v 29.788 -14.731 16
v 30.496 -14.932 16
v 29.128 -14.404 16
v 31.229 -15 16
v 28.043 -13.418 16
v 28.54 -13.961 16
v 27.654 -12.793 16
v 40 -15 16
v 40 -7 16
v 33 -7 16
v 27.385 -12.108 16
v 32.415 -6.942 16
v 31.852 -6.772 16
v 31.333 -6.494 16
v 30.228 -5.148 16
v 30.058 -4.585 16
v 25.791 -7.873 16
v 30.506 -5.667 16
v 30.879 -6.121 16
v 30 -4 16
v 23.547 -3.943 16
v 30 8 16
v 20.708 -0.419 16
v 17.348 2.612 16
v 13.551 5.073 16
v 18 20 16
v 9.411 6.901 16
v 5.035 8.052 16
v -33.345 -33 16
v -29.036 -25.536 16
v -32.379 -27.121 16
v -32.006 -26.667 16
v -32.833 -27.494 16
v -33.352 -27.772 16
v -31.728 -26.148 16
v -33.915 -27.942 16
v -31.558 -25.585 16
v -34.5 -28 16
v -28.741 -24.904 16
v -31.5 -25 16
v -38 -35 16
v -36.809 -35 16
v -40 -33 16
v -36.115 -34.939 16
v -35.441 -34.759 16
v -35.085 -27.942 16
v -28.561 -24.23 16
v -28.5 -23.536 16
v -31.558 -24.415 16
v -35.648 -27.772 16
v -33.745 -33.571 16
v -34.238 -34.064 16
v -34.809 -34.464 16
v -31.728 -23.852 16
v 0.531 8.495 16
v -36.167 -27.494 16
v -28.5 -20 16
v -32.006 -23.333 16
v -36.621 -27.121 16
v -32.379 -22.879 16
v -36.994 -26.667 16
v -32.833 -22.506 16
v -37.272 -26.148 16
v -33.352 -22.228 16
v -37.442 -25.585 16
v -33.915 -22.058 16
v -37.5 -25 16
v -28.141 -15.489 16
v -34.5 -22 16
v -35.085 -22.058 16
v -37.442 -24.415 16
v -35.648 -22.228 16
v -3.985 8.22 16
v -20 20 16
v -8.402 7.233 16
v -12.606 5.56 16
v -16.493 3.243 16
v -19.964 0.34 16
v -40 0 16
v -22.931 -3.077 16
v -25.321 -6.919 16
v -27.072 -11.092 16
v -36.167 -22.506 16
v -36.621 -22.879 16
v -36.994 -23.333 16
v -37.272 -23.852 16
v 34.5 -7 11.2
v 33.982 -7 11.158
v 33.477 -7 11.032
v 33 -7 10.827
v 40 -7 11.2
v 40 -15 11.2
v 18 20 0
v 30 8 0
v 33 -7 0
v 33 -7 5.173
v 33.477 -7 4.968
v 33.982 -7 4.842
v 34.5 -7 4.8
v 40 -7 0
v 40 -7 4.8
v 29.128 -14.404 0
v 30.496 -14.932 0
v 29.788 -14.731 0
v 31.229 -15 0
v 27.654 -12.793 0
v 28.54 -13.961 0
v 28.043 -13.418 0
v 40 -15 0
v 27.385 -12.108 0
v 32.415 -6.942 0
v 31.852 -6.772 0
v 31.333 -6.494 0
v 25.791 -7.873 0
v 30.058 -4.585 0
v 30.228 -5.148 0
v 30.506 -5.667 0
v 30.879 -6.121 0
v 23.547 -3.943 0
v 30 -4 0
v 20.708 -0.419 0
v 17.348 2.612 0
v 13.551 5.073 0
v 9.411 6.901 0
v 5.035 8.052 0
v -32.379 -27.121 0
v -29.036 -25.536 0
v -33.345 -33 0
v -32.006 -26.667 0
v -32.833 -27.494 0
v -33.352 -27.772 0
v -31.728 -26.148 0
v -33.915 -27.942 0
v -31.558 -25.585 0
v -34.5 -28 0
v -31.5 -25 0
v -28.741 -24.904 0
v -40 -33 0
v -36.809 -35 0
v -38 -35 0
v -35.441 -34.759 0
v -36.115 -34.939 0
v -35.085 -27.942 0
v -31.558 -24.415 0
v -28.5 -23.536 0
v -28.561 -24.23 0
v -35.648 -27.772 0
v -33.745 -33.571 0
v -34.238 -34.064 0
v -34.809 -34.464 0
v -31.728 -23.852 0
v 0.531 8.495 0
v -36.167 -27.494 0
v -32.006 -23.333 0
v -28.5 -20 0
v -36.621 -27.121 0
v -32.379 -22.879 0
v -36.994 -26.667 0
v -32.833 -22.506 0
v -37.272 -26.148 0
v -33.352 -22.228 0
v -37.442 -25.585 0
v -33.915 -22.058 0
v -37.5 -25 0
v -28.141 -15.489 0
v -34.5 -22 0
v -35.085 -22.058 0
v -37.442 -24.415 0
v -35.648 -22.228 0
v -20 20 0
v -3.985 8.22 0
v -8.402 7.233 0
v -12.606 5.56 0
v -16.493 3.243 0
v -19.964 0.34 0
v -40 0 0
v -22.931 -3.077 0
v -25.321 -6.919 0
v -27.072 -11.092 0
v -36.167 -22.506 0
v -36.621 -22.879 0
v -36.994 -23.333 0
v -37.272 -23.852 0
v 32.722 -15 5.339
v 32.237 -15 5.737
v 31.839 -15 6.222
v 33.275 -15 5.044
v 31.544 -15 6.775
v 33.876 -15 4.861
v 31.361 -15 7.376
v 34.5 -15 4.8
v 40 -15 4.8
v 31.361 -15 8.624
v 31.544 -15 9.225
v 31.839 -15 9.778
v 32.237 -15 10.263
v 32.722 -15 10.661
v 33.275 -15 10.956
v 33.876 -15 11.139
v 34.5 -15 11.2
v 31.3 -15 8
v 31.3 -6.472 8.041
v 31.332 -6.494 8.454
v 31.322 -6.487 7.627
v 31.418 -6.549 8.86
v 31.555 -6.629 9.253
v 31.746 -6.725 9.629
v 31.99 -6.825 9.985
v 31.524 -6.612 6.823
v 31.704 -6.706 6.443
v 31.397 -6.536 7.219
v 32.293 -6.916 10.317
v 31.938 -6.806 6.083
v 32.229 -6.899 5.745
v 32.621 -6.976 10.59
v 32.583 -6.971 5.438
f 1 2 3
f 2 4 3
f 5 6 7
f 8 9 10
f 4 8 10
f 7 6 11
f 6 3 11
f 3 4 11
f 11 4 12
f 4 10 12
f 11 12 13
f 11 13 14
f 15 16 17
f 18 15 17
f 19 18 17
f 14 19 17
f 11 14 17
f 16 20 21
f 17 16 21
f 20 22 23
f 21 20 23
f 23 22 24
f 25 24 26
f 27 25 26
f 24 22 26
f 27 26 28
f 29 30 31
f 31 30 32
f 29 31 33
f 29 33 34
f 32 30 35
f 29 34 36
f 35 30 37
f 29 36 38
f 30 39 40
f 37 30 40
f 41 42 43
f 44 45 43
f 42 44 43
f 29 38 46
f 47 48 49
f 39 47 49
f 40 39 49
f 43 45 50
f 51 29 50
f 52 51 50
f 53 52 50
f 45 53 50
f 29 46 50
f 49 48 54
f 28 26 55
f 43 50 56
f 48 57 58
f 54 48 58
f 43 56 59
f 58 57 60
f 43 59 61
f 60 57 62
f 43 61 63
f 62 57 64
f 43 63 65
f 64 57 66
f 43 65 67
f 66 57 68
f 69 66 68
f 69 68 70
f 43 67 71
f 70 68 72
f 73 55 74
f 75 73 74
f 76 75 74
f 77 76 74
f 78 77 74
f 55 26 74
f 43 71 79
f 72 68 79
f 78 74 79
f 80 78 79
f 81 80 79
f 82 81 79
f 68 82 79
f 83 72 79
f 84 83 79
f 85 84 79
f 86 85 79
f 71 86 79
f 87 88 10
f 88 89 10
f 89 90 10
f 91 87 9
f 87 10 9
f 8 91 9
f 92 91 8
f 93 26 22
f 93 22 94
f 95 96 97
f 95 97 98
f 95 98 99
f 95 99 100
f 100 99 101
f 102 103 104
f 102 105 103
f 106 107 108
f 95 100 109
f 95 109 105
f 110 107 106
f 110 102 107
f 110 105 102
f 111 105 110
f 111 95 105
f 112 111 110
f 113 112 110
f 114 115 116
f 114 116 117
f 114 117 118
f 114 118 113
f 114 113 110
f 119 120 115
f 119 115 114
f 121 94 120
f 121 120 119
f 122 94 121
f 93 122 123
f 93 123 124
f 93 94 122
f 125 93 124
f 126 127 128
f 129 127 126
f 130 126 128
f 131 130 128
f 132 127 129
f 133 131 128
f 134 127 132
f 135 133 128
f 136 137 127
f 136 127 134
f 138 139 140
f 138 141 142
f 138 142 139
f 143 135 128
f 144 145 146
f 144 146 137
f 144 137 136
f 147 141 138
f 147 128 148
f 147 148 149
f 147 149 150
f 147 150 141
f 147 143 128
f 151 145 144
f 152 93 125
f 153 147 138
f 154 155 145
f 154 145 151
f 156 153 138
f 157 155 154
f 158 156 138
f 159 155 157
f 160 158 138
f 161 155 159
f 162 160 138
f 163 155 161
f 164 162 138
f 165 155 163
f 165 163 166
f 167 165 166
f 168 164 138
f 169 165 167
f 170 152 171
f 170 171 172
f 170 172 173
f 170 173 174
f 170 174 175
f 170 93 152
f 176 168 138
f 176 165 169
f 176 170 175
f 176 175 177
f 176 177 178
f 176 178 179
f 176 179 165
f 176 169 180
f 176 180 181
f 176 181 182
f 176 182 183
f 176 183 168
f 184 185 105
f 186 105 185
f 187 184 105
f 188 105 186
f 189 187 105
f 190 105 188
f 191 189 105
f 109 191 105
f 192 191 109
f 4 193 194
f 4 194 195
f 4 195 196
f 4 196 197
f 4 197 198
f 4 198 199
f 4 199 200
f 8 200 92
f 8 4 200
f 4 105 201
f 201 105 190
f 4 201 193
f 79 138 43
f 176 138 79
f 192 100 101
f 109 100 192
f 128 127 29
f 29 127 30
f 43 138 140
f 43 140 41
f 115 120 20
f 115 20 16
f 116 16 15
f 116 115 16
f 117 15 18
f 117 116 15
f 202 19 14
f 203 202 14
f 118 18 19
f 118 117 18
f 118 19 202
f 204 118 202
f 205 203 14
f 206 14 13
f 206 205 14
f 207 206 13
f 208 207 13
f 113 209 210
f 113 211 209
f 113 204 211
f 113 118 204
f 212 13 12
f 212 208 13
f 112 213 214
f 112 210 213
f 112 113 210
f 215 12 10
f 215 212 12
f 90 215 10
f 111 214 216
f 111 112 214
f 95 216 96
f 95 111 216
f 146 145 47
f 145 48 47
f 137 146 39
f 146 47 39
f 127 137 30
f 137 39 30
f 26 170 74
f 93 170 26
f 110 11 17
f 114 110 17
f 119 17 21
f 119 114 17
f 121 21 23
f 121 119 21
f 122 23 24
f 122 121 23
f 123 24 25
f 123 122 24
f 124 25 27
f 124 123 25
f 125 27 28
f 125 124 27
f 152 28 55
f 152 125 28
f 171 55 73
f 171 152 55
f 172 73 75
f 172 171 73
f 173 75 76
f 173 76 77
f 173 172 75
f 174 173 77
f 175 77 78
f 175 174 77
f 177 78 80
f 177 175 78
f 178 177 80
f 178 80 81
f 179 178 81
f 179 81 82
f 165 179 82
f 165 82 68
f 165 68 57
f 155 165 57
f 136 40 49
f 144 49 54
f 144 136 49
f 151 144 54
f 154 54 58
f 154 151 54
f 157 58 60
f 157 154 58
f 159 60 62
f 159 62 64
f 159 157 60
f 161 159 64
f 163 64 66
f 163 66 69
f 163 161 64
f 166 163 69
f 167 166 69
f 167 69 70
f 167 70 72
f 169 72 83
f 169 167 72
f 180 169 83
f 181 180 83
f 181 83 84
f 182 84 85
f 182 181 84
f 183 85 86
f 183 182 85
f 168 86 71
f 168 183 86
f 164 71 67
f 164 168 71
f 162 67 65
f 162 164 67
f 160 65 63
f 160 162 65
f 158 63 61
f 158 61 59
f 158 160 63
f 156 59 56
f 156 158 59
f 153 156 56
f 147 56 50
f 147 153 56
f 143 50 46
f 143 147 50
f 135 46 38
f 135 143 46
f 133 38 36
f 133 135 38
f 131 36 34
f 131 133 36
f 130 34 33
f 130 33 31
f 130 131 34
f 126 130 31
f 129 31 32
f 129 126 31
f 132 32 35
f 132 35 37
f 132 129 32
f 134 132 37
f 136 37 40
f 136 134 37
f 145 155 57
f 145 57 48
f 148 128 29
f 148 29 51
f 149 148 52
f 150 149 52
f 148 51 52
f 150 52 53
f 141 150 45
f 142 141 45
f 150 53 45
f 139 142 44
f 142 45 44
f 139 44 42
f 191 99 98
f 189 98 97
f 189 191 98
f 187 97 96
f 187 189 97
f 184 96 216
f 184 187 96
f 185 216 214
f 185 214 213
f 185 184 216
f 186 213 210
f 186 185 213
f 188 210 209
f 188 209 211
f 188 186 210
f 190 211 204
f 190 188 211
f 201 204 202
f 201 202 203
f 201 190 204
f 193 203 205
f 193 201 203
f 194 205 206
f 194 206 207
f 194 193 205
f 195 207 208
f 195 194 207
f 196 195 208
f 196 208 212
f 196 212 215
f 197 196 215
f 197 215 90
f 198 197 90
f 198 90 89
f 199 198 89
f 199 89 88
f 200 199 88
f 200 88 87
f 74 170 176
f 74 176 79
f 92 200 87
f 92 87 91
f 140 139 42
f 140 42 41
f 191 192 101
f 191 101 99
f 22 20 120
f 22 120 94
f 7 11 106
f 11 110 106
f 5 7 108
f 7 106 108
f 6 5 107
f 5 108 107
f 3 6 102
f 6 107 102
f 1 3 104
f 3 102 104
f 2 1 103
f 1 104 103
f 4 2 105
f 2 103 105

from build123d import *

# Parameters (mm, degrees)
SKETCH_1_R          = 3
EXTRUDE_1_DEPTH     = 16
CHAMFER_1_SIZE      = 6
CHAMFER_1_SIZE2     = 10.392304845
SKETCH_2_W          = 70.200678886
SKETCH_2_H          = 11.369261619
CUT_EXTRUDE_1_DEPTH = 56.506756346
CHAMFER_2_SIZE      = 20
SKETCH_4_W          = 15.06489792
SKETCH_4_H          = 29.640391265
CUT_EXTRUDE_2_DEPTH = 56.506756346
CHAMFER_3_SIZE      = 12
FILLET_1_R          = 3
FILLET_2_R          = 4
FILLET_3_R          = 4
FILLET_4_R          = 4
CHAMFER_4_SIZE      = 2
CUT_EXTRUDE_3_DEPTH = 10


with BuildPart() as part:
    # 草图1 → 凸台-拉伸1 (new body)
    with BuildSketch(Plane.XY):
        with BuildLine():
            Line((-40, 20), (40, 20))
            Line((40, 20), (40, -20))
            Line((40, -20), (28.5, -20))
            ThreePointArc((28.5, -20), (0, 8.5), (-28.5, -20))
            Line((-28.5, -20), (-28.5, -35))
            Line((-28.5, -35), (-40, -35))
            Line((-40, -35), (-40, -20))
            Line((-40, -20), (-40, 20))
        make_face()
        with Locations((-34.5, -25)):
            Circle(SKETCH_1_R, mode=Mode.SUBTRACT)
    extrude(amount=EXTRUDE_1_DEPTH)

    # 倒角1
    chamfer_1_edges = [part.edges().sort_by_distance(p)[0] for p in [
        (-28.5, -35, 8),
    ]]
    chamfer_1_side = [part.faces().sort_by_distance(p)[0] for p in [
        (-34.25, -35, 8),
    ]]
    chamfer(chamfer_1_edges, length=CHAMFER_1_SIZE, length2=CHAMFER_1_SIZE2, reference=chamfer_1_side[0])

    # 草图2 → 切除-拉伸1 (cut, through all)
    with BuildSketch(Plane.XY.offset(16)):
        with Locations((17.588251777, -20.68463081)):
            Rectangle(SKETCH_2_W, SKETCH_2_H)
    extrude(amount=-CUT_EXTRUDE_1_DEPTH, mode=Mode.SUBTRACT)

    # 倒角2
    chamfer_2_edges = [part.edges().sort_by_distance(p)[0] for p in [
        (-40, 20, 8),
    ]]
    chamfer(chamfer_2_edges, length=CHAMFER_2_SIZE)

    # 草图4 → 切除-拉伸2 (cut, through all)
    with BuildSketch(Plane.XY.offset(16)):
        with Locations((37.53244896, 7.820195633)):
            Rectangle(SKETCH_4_W, SKETCH_4_H)
    extrude(amount=-CUT_EXTRUDE_2_DEPTH, mode=Mode.SUBTRACT)

    # 倒角3
    chamfer_3_edges = [part.edges().sort_by_distance(p)[0] for p in [
        (30, 20, 8),
    ]]
    chamfer(chamfer_3_edges, length=CHAMFER_3_SIZE)

    # 圆角1
    fillet_1_edges = [part.edges().sort_by_distance(p)[0] for p in [
        (30, -7, 8),
    ]]
    fillet(fillet_1_edges, radius=FILLET_1_R)

    # 圆角2
    fillet_2_edges = [part.edges().sort_by_distance(p)[0] for p in [
        (-28.5, -24.607695155, 8),
    ]]
    fillet(fillet_2_edges, radius=FILLET_2_R)

    # 圆角3
    fillet_3_edges = [part.edges().sort_by_distance(p)[0] for p in [
        (-34.5, -35, 8),
    ]]
    fillet(fillet_3_edges, radius=FILLET_3_R)

    # 圆角4
    fillet_4_edges = [part.edges().sort_by_distance(p)[0] for p in [
        (28.057975693, -15, 8),
    ]]
    fillet(fillet_4_edges, radius=FILLET_4_R)

    # 倒角4
    chamfer_4_edges = [part.edges().sort_by_distance(p)[0] for p in [
        (-40, -35, 8),
    ]]
    chamfer(chamfer_4_edges, length=CHAMFER_4_SIZE)

    # 草图5 → 切除-拉伸3 (cut)
    with BuildSketch(Plane.XZ.offset(15)):
        with BuildLine():
            Line((34.5, 11.2), (41.178159838, 11.2))
            ThreePointArc((41.178159838, 11.2), (44.378159838, 8), (41.178159838, 4.8))
            Line((41.178159838, 4.8), (34.5, 4.8))
            ThreePointArc((34.5, 4.8), (31.3, 8), (34.5, 11.2))
        make_face()
    extrude(amount=-CUT_EXTRUDE_3_DEPTH, mode=Mode.SUBTRACT)


solid = part.part
